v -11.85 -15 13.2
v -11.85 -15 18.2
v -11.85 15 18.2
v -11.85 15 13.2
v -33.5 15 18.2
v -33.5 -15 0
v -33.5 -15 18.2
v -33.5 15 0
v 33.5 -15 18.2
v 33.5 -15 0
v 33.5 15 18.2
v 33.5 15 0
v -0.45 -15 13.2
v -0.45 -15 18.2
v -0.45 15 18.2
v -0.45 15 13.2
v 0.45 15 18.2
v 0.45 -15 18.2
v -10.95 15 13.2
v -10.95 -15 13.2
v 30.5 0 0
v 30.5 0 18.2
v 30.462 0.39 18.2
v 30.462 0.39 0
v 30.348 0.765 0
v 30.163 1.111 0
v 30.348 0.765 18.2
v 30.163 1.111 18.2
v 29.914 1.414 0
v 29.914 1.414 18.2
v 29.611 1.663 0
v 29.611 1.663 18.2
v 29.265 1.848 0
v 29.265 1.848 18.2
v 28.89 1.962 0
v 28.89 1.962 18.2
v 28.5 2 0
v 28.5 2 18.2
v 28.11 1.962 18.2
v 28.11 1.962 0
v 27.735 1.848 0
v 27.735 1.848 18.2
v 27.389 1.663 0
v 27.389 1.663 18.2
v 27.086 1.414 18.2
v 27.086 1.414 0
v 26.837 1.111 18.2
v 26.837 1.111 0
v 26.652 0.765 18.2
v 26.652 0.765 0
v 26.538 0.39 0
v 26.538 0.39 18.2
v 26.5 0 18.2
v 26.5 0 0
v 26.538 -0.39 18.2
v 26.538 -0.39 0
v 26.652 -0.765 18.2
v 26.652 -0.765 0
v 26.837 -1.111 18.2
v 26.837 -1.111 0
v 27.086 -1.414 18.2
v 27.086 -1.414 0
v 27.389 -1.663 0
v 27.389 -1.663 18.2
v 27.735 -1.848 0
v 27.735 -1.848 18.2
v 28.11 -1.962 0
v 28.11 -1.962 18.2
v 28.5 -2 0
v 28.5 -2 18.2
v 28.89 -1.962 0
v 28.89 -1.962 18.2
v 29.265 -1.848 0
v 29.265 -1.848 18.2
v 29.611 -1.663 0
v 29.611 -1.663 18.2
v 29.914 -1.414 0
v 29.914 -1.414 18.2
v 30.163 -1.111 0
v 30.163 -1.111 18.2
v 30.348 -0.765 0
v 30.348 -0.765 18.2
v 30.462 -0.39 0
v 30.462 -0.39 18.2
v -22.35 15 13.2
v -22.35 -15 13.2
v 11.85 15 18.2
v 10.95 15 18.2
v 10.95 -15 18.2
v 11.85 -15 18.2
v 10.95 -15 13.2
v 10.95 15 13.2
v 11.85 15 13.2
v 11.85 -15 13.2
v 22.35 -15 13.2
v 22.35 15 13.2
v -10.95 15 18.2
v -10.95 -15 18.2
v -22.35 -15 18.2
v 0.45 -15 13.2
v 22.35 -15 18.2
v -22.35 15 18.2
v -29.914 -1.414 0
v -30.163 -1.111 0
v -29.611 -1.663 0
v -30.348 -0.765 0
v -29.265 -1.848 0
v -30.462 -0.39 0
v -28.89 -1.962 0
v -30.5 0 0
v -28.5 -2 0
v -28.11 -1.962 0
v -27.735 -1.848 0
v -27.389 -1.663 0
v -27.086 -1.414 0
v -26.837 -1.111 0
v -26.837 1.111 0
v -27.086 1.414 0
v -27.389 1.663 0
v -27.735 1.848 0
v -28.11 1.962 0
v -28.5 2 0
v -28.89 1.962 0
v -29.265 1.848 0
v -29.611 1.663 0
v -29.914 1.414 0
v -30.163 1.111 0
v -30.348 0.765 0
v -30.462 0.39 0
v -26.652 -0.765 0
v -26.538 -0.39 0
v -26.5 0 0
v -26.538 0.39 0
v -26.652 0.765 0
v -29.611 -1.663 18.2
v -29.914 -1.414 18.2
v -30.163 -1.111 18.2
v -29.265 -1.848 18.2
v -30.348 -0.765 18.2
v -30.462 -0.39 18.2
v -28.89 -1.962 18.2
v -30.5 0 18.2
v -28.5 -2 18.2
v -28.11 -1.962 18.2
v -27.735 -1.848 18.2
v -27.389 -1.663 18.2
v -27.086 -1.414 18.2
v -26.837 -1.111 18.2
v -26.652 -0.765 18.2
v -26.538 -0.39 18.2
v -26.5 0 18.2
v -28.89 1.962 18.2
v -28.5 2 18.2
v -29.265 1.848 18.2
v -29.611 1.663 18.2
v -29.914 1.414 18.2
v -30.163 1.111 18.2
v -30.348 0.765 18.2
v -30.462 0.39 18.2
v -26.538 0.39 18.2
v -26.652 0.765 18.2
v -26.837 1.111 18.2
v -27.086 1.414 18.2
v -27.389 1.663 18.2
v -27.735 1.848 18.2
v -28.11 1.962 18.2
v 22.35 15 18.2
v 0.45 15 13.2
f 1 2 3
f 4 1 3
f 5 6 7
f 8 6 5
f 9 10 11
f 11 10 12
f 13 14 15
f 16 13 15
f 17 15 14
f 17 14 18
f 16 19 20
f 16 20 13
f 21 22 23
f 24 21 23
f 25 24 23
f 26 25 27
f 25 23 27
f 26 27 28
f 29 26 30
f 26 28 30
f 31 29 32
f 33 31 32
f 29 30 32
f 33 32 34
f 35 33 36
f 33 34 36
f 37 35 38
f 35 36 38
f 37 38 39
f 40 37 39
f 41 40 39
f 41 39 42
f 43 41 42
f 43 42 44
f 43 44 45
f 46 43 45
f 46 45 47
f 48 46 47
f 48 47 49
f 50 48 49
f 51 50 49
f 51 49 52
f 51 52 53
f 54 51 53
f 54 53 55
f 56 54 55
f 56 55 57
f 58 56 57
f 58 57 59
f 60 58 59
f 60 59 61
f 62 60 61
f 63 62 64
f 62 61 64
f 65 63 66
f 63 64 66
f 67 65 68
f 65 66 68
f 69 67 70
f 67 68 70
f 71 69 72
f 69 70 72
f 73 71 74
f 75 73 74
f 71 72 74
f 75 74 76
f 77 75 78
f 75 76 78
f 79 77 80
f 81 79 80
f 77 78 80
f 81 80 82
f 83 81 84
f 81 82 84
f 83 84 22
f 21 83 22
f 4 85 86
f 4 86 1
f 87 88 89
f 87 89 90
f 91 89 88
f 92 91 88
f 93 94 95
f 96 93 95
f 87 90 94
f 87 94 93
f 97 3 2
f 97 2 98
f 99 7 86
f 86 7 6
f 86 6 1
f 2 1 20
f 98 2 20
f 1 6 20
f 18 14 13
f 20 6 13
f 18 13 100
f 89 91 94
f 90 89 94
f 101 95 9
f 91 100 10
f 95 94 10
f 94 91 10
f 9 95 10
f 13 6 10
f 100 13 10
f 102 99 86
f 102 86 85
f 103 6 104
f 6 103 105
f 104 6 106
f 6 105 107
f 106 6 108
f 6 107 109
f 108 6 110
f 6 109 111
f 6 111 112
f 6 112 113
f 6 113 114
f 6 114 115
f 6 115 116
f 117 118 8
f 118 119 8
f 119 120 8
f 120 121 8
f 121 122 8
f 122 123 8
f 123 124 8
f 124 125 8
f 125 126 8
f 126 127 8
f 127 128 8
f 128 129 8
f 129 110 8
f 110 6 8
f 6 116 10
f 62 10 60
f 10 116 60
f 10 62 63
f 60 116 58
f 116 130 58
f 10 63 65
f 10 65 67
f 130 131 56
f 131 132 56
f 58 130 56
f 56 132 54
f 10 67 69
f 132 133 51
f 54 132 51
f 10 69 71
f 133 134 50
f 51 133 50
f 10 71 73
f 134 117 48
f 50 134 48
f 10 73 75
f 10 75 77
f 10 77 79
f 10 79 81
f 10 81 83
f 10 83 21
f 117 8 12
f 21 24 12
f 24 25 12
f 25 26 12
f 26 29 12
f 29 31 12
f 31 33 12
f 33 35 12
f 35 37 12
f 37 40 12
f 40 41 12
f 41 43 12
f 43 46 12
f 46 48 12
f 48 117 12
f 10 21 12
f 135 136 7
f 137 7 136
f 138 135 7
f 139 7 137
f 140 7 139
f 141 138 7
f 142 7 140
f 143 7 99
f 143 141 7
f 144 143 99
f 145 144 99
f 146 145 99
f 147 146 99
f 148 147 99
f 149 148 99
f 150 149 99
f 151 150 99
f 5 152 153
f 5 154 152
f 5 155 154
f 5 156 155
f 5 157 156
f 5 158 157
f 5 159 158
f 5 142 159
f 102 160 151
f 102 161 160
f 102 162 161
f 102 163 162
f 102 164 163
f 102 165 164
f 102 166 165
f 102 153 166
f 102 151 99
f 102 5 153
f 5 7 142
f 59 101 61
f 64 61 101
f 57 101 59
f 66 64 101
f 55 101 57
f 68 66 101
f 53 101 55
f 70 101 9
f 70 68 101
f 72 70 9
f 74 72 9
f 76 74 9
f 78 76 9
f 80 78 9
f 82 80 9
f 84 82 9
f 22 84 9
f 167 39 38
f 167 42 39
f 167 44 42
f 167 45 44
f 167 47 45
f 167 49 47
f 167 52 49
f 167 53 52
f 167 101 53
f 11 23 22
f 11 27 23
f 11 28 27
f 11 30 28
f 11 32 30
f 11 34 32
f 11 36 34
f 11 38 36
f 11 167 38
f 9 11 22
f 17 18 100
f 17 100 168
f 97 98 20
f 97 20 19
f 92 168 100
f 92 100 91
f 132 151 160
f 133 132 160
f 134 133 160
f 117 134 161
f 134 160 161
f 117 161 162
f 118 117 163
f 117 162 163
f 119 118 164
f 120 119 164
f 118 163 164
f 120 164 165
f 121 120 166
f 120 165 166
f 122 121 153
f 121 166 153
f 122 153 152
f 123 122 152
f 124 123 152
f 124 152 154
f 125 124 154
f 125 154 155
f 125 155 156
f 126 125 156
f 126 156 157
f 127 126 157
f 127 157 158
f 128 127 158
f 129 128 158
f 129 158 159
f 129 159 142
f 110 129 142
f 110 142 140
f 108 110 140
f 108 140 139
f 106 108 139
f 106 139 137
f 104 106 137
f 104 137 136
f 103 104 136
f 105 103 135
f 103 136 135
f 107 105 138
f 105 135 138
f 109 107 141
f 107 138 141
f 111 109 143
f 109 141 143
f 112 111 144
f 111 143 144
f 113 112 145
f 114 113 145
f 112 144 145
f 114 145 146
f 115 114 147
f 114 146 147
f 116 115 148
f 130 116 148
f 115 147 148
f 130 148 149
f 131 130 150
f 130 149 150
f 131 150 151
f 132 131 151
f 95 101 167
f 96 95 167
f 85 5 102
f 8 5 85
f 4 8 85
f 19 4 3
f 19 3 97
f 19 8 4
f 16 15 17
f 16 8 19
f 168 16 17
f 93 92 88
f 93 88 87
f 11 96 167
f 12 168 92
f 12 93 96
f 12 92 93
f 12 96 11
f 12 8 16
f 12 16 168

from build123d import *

# Parameters (mm, degrees)
SKETCH_1_W          = 67
SKETCH_1_H          = 30
EXTRUDE_1_DEPTH     = 18.2
SKETCH_2_R          = 2
CUT_EXTRUDE_1_DEPTH = 19
SKETCH_3_W          = 10.5
SKETCH_3_H          = 30
CUT_EXTRUDE_2_DEPTH = 5


with BuildPart() as part:
    # 草图1 → 凸台-拉伸1 (new body)
    with BuildSketch(Plane.XY):
        Rectangle(SKETCH_1_W, SKETCH_1_H)
    extrude(amount=EXTRUDE_1_DEPTH)

    # 草图2 → 切除-拉伸1 (cut)
    with BuildSketch(Plane.XY.offset(18.2)):
        with Locations((-28.5, 0)):
            Circle(SKETCH_2_R)
        with Locations((28.5, 0)):
            Circle(SKETCH_2_R)
    extrude(amount=-CUT_EXTRUDE_1_DEPTH, mode=Mode.SUBTRACT)

    # 草图3 → 切除-拉伸2 (cut)
    with BuildSketch(Plane.XY.offset(18.2)):
        with Locations((-5.7, 0)):
            Rectangle(SKETCH_3_W, SKETCH_3_H)
        with Locations((-17.1, 0)):
            Rectangle(SKETCH_3_W, SKETCH_3_H)
        with Locations((17.1, 0)):
            Rectangle(SKETCH_3_W, SKETCH_3_H)
        with Locations((5.7, 0)):
            Rectangle(SKETCH_3_W, SKETCH_3_H)
    extrude(amount=-CUT_EXTRUDE_2_DEPTH, mode=Mode.SUBTRACT)


solid = part.part
